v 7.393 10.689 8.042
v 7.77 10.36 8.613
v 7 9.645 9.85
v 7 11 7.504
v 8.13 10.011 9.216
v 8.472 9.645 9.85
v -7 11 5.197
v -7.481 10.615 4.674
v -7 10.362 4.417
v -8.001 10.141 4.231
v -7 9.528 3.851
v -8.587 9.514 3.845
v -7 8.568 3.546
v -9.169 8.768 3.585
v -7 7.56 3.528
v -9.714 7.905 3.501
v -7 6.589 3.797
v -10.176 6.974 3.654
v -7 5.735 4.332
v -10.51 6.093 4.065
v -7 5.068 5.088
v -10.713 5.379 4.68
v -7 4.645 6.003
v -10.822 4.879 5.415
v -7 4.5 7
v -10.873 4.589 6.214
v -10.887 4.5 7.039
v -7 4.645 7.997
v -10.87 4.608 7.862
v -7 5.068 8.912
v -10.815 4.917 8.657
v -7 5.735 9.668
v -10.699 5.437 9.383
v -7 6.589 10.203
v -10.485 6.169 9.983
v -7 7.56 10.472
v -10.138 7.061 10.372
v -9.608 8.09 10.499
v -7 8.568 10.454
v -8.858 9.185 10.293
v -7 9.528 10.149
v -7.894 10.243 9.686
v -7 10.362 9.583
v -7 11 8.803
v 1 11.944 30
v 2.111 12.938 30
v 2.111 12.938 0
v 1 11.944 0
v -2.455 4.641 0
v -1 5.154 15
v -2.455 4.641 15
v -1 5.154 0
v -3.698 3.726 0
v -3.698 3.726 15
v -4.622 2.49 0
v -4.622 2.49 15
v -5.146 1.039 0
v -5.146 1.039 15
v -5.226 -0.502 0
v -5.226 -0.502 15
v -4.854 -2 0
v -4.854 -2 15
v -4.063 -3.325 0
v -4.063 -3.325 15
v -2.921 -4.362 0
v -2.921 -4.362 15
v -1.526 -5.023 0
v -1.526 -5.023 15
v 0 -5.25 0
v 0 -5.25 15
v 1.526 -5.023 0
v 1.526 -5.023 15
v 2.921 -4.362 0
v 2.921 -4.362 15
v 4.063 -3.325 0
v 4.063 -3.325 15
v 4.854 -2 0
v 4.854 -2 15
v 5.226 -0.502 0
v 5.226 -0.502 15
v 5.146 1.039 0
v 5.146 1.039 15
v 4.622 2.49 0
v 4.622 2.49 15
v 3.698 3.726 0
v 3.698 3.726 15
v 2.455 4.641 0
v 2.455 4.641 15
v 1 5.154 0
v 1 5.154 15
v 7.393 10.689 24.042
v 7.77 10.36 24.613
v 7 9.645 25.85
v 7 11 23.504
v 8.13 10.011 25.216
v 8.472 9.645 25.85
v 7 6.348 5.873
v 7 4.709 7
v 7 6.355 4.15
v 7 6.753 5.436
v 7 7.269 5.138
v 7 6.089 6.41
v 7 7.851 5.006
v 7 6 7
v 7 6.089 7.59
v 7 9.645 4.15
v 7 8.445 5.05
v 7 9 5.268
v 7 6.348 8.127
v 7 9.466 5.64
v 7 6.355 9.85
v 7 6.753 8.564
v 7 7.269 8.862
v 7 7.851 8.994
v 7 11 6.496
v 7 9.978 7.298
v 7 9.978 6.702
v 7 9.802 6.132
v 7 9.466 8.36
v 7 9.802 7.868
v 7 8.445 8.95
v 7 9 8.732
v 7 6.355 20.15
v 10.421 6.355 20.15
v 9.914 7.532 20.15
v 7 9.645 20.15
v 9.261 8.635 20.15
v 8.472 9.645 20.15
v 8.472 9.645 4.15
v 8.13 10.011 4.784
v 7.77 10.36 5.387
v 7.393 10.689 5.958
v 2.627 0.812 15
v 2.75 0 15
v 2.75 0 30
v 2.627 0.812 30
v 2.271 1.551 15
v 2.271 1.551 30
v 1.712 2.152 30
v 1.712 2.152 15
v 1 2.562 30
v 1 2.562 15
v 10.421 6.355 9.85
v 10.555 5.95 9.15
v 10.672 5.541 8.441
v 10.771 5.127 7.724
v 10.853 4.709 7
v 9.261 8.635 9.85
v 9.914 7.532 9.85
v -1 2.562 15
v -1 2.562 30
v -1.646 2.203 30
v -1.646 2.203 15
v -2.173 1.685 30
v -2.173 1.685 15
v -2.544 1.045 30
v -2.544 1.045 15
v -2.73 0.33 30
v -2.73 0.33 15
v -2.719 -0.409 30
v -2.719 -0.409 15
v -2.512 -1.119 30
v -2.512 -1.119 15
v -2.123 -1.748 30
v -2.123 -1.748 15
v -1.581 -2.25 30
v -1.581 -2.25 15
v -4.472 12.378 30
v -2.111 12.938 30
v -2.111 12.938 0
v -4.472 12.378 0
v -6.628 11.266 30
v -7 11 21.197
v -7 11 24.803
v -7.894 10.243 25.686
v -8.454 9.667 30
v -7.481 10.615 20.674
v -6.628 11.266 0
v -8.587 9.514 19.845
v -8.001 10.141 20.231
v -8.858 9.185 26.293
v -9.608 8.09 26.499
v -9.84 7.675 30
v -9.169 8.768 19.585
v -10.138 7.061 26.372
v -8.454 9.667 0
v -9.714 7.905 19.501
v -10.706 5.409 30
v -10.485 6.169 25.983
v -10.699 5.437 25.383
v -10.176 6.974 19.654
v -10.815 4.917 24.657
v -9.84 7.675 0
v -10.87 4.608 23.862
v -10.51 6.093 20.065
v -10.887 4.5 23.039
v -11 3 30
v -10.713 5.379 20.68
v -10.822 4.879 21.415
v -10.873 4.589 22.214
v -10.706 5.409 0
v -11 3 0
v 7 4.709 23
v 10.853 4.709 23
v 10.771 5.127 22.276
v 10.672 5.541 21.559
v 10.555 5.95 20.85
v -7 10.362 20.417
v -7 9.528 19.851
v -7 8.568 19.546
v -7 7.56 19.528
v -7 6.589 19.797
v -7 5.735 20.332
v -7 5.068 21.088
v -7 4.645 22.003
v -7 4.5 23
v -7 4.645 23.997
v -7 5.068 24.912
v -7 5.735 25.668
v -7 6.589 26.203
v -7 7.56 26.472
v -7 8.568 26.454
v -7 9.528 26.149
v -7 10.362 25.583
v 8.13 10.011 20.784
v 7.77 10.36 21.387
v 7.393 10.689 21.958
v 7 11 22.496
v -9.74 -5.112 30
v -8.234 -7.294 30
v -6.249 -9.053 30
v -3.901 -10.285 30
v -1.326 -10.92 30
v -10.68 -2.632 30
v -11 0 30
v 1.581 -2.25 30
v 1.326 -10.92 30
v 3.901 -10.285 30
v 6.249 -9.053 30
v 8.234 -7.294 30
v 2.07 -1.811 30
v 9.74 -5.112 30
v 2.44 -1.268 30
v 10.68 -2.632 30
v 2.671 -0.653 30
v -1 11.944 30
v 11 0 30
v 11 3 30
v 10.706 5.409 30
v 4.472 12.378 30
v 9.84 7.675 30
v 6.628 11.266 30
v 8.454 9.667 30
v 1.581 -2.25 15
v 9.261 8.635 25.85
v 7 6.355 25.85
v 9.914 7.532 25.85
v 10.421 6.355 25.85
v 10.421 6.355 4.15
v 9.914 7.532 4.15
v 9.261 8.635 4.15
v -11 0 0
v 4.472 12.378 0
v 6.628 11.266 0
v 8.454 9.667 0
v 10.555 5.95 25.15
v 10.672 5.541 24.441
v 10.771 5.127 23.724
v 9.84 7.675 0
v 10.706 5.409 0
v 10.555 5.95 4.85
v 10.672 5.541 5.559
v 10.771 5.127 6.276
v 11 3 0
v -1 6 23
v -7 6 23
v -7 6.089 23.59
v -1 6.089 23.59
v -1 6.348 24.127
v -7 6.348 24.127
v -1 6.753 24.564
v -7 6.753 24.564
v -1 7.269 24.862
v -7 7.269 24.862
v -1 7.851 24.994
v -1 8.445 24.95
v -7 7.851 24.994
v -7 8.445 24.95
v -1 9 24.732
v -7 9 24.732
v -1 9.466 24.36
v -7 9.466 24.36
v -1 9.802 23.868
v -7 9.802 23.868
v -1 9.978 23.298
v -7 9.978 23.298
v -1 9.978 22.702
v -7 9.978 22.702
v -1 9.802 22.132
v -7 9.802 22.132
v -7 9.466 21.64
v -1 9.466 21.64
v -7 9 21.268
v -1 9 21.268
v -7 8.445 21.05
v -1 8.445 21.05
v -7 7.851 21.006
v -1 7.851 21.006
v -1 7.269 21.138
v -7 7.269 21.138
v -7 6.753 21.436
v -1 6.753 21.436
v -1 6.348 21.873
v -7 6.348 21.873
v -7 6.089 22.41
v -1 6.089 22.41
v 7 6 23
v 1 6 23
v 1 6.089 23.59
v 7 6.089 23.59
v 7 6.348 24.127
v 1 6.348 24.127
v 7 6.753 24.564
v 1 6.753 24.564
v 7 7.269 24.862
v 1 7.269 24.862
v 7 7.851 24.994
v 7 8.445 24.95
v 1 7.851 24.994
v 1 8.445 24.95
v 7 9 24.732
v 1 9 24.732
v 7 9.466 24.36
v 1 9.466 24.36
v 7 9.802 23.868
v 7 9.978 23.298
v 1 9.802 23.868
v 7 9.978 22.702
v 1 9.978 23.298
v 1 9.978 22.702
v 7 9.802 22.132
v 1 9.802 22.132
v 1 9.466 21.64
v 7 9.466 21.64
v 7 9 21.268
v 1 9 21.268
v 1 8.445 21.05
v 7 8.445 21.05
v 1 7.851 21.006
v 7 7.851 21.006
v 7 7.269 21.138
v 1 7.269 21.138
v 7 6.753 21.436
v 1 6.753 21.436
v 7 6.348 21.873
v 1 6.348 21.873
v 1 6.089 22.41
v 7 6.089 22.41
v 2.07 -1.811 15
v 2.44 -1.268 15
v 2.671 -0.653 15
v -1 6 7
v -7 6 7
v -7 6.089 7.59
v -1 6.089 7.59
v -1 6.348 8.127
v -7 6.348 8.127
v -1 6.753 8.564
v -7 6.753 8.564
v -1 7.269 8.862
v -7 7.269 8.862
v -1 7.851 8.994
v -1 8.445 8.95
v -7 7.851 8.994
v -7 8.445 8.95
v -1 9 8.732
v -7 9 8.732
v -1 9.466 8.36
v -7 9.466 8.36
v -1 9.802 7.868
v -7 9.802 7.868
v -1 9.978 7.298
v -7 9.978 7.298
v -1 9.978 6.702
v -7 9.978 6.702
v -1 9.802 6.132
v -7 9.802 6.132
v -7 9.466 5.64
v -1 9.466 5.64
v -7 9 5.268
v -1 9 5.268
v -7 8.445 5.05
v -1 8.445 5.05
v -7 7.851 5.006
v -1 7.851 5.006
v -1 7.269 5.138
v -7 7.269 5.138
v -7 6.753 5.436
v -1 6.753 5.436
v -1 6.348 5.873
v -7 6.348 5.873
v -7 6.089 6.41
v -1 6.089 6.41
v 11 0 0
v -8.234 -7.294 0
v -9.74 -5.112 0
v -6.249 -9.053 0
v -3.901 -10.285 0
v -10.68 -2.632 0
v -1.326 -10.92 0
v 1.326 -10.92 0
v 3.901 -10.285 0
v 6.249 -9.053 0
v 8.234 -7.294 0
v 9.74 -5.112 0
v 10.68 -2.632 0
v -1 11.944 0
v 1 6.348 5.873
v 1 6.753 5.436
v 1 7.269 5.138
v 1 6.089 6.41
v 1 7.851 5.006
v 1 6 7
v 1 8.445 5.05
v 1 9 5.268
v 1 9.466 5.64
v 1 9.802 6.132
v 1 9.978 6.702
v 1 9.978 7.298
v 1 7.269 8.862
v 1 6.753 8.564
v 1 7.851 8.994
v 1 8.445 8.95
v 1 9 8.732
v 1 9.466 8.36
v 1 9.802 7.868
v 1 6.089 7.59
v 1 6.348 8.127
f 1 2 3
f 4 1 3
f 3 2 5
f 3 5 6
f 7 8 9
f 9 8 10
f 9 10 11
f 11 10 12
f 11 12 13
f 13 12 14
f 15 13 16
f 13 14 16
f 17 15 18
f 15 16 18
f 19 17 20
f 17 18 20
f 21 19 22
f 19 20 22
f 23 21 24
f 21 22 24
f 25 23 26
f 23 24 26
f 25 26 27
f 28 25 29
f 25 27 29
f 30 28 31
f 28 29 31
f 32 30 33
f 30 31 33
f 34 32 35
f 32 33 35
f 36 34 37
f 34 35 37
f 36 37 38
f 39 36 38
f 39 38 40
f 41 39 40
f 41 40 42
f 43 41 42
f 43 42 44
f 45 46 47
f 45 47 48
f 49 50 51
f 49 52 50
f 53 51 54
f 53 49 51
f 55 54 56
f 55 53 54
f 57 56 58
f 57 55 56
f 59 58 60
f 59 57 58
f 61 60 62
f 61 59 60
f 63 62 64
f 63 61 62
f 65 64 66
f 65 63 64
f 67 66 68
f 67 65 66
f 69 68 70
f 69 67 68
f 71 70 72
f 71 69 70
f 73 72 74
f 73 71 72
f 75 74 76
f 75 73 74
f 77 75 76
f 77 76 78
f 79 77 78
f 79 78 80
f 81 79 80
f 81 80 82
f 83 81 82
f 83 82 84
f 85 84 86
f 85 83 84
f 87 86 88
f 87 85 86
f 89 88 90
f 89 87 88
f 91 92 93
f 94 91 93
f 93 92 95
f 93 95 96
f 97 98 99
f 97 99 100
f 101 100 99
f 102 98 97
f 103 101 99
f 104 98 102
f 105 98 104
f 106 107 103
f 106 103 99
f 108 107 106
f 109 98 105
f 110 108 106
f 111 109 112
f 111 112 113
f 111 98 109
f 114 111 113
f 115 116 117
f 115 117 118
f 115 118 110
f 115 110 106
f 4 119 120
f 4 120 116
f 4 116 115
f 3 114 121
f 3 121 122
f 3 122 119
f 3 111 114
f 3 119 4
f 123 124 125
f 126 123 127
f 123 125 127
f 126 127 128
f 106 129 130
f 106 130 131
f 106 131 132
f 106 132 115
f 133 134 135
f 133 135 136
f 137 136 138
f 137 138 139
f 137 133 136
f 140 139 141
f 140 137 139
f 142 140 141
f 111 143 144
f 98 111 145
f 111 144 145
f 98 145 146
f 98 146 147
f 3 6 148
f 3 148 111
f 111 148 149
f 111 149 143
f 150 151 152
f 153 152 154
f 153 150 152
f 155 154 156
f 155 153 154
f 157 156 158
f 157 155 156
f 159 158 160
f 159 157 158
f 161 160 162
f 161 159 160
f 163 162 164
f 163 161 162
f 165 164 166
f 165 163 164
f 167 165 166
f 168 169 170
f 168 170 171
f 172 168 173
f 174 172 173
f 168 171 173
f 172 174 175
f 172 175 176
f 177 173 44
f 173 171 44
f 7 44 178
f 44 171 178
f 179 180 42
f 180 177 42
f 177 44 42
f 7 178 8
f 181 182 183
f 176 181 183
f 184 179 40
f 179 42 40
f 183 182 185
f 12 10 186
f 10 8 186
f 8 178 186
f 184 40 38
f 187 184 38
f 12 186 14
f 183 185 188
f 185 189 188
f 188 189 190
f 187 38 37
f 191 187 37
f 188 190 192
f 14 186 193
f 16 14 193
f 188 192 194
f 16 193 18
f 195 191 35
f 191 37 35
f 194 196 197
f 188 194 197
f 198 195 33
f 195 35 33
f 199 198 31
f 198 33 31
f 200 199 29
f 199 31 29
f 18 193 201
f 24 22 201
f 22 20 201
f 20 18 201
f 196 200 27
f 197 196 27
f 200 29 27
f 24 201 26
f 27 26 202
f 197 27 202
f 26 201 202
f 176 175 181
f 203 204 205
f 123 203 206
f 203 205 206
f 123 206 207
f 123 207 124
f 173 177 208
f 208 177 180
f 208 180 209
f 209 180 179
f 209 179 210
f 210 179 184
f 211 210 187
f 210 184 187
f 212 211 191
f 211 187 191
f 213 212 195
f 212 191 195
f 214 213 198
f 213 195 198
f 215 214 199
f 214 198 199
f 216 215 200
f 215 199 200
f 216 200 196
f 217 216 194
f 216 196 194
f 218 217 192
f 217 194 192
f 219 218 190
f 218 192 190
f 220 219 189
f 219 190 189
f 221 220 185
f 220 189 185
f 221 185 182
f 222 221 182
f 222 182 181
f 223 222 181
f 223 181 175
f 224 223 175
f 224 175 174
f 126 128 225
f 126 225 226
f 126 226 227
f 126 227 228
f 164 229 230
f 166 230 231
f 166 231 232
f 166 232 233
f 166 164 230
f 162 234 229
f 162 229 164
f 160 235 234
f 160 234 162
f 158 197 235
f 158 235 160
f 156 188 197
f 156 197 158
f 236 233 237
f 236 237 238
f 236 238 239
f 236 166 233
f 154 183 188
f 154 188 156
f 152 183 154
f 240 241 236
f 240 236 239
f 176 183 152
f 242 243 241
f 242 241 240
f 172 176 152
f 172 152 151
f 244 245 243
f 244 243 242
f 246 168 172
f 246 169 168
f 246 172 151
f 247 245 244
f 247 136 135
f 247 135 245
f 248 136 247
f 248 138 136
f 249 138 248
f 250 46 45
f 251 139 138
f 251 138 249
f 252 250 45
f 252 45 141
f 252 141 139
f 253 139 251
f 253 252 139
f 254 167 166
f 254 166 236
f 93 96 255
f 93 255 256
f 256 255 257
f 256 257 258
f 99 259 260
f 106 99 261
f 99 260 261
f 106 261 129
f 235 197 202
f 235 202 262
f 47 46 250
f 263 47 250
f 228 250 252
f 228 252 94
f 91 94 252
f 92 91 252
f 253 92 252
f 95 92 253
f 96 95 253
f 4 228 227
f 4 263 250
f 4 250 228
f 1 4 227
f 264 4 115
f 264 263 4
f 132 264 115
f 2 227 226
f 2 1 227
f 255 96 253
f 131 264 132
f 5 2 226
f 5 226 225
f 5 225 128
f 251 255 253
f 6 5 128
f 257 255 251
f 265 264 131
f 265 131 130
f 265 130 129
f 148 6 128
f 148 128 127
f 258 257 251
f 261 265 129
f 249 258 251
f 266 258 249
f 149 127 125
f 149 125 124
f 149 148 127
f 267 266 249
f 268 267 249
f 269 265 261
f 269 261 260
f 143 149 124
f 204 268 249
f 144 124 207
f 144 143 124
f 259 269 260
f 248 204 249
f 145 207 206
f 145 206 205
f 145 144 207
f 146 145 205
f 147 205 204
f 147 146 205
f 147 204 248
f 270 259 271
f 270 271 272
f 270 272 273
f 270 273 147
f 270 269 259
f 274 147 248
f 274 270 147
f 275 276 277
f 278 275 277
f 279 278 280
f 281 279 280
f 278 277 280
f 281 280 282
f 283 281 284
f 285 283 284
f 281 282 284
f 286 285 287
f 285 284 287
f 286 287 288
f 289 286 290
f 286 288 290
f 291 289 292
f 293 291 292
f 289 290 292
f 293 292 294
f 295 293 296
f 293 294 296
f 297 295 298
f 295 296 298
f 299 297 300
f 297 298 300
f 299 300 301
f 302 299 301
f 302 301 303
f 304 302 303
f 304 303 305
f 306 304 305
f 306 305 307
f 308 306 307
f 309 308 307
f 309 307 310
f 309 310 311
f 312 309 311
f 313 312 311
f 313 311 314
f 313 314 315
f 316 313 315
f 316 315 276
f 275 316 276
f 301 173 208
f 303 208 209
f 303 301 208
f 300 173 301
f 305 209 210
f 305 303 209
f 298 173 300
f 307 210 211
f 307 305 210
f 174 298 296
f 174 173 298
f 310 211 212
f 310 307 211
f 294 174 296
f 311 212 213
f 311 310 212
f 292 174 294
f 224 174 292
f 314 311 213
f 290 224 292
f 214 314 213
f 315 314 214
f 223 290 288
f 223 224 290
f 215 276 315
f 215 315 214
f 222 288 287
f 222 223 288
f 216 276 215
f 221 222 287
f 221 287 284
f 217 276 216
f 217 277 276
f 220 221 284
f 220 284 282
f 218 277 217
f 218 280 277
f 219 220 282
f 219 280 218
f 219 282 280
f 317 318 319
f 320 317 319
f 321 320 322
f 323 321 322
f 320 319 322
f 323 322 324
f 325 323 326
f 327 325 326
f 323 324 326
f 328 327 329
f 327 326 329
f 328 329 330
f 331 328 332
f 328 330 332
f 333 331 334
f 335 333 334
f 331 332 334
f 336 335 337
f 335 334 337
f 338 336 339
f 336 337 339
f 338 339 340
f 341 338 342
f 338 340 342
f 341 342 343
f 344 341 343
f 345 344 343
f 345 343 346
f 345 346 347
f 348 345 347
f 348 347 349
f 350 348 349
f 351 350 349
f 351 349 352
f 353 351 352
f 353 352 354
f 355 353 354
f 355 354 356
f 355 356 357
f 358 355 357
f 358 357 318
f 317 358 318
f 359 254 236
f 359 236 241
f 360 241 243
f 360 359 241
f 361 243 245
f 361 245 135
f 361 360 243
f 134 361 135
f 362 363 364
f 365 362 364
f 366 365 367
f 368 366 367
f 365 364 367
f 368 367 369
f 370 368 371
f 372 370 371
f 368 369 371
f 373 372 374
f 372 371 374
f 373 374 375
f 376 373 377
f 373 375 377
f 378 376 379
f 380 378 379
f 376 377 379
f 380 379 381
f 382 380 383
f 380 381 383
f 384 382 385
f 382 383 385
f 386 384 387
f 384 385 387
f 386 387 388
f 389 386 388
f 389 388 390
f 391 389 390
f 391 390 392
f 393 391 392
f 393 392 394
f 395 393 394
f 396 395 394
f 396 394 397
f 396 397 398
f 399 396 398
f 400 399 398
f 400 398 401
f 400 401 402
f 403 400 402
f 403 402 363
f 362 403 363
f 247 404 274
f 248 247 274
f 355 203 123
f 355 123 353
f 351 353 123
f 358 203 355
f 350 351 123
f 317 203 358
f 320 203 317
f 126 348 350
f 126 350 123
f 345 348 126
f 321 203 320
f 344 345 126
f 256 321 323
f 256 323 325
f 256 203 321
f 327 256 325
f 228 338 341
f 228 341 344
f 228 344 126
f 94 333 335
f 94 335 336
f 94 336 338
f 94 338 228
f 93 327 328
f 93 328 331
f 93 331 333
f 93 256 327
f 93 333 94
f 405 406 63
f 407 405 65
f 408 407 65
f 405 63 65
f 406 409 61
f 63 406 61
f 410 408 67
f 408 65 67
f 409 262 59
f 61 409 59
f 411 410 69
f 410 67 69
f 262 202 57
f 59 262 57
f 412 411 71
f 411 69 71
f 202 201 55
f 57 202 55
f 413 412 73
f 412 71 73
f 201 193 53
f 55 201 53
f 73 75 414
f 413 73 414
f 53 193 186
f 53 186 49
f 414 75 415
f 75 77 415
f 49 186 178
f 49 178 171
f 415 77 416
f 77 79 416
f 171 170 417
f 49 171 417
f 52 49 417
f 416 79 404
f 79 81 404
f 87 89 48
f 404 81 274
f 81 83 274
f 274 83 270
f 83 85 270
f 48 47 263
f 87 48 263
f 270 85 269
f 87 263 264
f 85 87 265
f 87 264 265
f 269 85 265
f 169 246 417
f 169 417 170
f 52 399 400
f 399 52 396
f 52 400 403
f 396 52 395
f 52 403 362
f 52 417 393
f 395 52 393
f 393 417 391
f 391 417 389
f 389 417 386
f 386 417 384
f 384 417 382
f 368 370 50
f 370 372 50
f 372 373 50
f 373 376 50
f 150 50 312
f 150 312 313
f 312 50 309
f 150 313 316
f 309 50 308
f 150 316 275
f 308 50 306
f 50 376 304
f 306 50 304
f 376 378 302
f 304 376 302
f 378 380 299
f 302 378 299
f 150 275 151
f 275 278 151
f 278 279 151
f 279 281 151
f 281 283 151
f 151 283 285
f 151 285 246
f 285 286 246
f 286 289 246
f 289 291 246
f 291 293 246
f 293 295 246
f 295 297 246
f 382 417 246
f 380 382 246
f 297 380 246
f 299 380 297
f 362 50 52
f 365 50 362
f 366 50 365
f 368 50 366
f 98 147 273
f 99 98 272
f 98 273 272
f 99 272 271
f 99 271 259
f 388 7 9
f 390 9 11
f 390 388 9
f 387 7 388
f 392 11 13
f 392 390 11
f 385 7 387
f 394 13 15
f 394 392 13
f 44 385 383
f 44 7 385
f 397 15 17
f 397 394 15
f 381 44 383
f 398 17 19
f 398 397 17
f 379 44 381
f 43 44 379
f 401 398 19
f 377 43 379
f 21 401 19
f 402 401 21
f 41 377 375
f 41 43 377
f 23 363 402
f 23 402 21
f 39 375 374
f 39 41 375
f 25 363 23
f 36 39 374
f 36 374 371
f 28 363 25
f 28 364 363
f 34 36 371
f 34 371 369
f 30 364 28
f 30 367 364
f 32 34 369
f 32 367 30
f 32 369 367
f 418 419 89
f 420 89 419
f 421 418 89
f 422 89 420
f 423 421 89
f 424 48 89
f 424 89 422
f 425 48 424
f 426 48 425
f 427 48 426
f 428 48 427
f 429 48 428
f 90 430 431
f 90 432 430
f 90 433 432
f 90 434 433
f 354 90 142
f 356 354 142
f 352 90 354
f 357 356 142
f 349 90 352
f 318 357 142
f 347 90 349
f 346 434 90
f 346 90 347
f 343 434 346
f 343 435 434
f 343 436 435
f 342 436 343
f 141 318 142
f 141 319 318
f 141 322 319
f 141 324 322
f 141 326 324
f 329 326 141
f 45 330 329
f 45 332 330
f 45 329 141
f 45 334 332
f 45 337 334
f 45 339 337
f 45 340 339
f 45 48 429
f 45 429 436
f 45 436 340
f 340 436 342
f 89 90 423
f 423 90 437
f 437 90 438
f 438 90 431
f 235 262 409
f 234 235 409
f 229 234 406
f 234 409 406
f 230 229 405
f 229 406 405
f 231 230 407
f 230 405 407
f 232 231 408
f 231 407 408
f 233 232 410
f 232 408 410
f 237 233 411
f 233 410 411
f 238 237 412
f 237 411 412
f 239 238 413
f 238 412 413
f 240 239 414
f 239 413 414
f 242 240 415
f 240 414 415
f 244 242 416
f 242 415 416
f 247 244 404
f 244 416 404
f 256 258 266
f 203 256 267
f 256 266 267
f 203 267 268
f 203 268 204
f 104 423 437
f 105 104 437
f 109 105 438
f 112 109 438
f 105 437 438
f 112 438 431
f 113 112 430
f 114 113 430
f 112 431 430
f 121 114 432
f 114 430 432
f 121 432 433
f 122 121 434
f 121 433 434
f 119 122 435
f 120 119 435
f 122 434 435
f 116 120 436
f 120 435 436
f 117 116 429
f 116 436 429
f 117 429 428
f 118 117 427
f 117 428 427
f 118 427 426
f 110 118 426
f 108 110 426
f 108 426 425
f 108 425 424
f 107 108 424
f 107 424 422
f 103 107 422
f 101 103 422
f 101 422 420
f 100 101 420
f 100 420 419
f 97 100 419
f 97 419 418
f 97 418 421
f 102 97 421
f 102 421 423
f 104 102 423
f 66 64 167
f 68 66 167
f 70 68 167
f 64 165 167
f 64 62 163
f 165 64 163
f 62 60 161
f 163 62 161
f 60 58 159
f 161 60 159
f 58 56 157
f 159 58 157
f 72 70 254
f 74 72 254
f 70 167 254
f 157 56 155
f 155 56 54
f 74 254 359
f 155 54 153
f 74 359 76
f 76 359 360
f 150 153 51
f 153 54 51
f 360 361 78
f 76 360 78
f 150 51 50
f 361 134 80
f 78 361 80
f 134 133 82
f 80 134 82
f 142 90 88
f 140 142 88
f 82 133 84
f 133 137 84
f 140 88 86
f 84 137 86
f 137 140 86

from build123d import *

# Parameters (mm, degrees)
F0_R         = 5.25
F1_DEPTH     = 30
F2_DEPTH     = 15
F3_DEPTH     = 30
F4_R         = 2
F6_DEPTH     = 22
F4_R_2       = 3.5
F7_DEPTH     = 4
F5_R         = 2
F8_DEPTH     = 4
F9_W         = 1
F9_H         = 30
F10_DEPTH    = 15
F11_T1_DEPTH = 80
F12_T1_DEPTH = 35.7073493424


# Not quite as in the source:
# - a fillet or chamfer that OpenCascade refuses, or shapes differently, is made with other operations: its cross-section is extruded or revolved along the edge and cut away or added


with BuildPart() as f1:
    # F0 (on Top) → F1 (new body)
    with BuildSketch(Plane.XY):
        with BuildLine():
            ThreePointArc((-11, 0), (0, -11), (11, 0))
            ThreePointArc((11, 0), (7.7781745931, 7.7781745931), (0, 11))
            ThreePointArc((0, 11), (-7.7781745931, 7.7781745931), (-11, 0))
        make_face()
        Circle(F0_R, mode=Mode.SUBTRACT)
        Circle(F0_R)
        with BuildLine():
            ThreePointArc((-1.5811388301, -2.25), (-1.2677476518, 2.4403515918), (2.75, 0))
            ThreePointArc((2.75, 0), (2.4403515918, -1.2677476518), (1.5811388301, -2.25))
            ThreePointArc((1.5811388301, -2.25), (0, -2.75), (-1.5811388301, -2.25))
        make_face(mode=Mode.SUBTRACT)
        with BuildLine():
            ThreePointArc((-11, 0), (-7.7781745931, 7.7781745931), (0, 11))
            Line((0, 11), (-11, 11))
            Line((-11, 11), (-11, 0))
        make_face()
        with BuildLine():
            ThreePointArc((0, 11), (7.7781745931, 7.7781745931), (11, 0))
            Line((11, 0), (11, 11))
            Line((11, 11), (0, 11))
        make_face()
        Polygon((-11, 11), (0, 11), (11, 11), (11, 13), (-11, 13), align=None)
        with BuildLine():
            Line((0, -2.25), (-1.5811388301, -2.25))
            ThreePointArc((-1.5811388301, -2.25), (0, -2.75), (1.5811388301, -2.25))
            Line((1.5811388301, -2.25), (0, -2.25))
        make_face()
        with BuildLine():
            ThreePointArc((1.5811388301, -2.25), (2.4403515918, -1.2677476518), (2.75, 0))
            ThreePointArc((2.75, 0), (-1.2677476518, 2.4403515918), (-1.5811388301, -2.25))
            Line((-1.5811388301, -2.25), (0, -2.25))
            Line((0, -2.25), (1.5811388301, -2.25))
        make_face()
    extrude(amount=F1_DEPTH)

    # F0 (on Top) → F2 (cut)
    with BuildSketch(Plane.XY):
        Circle(F0_R)
        with BuildLine():
            ThreePointArc((-1.5811388301, -2.25), (-1.2677476518, 2.4403515918), (2.75, 0))
            ThreePointArc((2.75, 0), (2.4403515918, -1.2677476518), (1.5811388301, -2.25))
            ThreePointArc((1.5811388301, -2.25), (0, -2.75), (-1.5811388301, -2.25))
        make_face(mode=Mode.SUBTRACT)
        with BuildLine():
            Line((0, -2.25), (-1.5811388301, -2.25))
            ThreePointArc((-1.5811388301, -2.25), (0, -2.75), (1.5811388301, -2.25))
            Line((1.5811388301, -2.25), (0, -2.25))
        make_face()
    extrude(amount=F2_DEPTH, mode=Mode.SUBTRACT)

    # F0 (on Top) → F3 (cut)
    with BuildSketch(Plane.XY):
        with BuildLine():
            ThreePointArc((1.5811388301, -2.25), (2.4403515918, -1.2677476518), (2.75, 0))
            ThreePointArc((2.75, 0), (-1.2677476518, 2.4403515918), (-1.5811388301, -2.25))
            Line((-1.5811388301, -2.25), (0, -2.25))
            Line((0, -2.25), (1.5811388301, -2.25))
        make_face()
    extrude(amount=F3_DEPTH, mode=Mode.SUBTRACT)

    # F4 (on face) → F6 (cut)
    with BuildSketch(Plane(origin=(-11, 0, 0), x_dir=(0, -1, 0), z_dir=(-1, 0, 0))):
        with Locations((-8, 7)):
            Circle(F4_R)
        with Locations((-8, 23)):
            Circle(F4_R)
    extrude(amount=-F6_DEPTH, mode=Mode.SUBTRACT)

    # F4 (on face) → F7 (cut)
    with BuildSketch(Plane(origin=(-11, 0, 0), x_dir=(0, -1, 0), z_dir=(-1, 0, 0))):
        with Locations((-8, 7)):
            Circle(F4_R_2)
        with Locations((-8, 7)):
            Circle(F4_R, mode=Mode.SUBTRACT)
        with Locations((-8, 23)):
            Circle(F4_R_2)
        with Locations((-8, 23)):
            Circle(F4_R, mode=Mode.SUBTRACT)
    extrude(amount=-F7_DEPTH, mode=Mode.SUBTRACT)

    # F5 (on face) → F8 (cut)
    with BuildSketch(Plane.YZ.offset(11)):
        Polygon((6.3545517328, 4.15), (9.6454482672, 4.15), (11.2908965344, 7), (9.6454482672, 9.85), (6.3545517328, 9.85), (4.7091034656, 7), align=None)
        with Locations((8, 7)):
            Circle(F5_R, mode=Mode.SUBTRACT)
        Polygon((6.3545517328, 20.15), (9.6454482672, 20.15), (11.2908965344, 23), (9.6454482672, 25.85), (6.3545517328, 25.85), (4.7091034656, 23), align=None)
        with Locations((8, 23)):
            Circle(F5_R, mode=Mode.SUBTRACT)
    extrude(amount=-F8_DEPTH, mode=Mode.SUBTRACT)

    # F9 (on face) → F10 (cut)
    with BuildSketch(Plane(origin=(0, 13, 0), x_dir=(-1, 0, 0), z_dir=(0, 1, 0))):
        with Locations((0.5, 15)):
            Rectangle(F9_W, F9_H)
        with Locations((-0.5, 15)):
            Rectangle(F9_W, F9_H)
    extrude(amount=-F10_DEPTH, mode=Mode.SUBTRACT)

    # F11: fillet of radius 10 on 2 edges, made by hand

    # F11_s2 → F11_t1 (cut)
    with BuildSketch(Plane.XY.offset(-25)):
        with BuildLine():
            ThreePointArc((-1, 13), (-8.0710678119, 10.0710678119), (-11, 3))
            Line((-11, 3), (-11, 13))
            Line((-11, 13), (-1, 13))
        make_face()
        with BuildLine():
            ThreePointArc((1, 13), (8.0710678119, 10.0710678119), (11, 3))
            Line((11, 3), (11, 13))
            Line((11, 13), (1, 13))
        make_face()
    extrude(amount=F11_T1_DEPTH, mode=Mode.SUBTRACT)

    # F12: chamfer of 1 on 2 edges, made by hand

    # F12_s2 → F12_t1 (cut)
    with BuildSketch(Plane.XY.offset(-2.8536746712)):
        with BuildLine():
            Line((-1, 11.94427191), (-2.1111111111, 12.9380799))
            ThreePointArc((-2.1111111111, 12.9380799), (-1.5705391213, 12.983710989), (-1, 13))
            Line((-1, 13), (-1, 11.94427191))
        make_face()
        with BuildLine():
            Line((2.1111111111, 12.9380799), (1, 11.94427191))
            Line((1, 11.94427191), (1, 13))
            ThreePointArc((1, 13), (1.5705391213, 12.983710989), (2.1111111111, 12.9380799))
        make_face()
    extrude(amount=F12_T1_DEPTH, mode=Mode.SUBTRACT)


solid = f1.part
